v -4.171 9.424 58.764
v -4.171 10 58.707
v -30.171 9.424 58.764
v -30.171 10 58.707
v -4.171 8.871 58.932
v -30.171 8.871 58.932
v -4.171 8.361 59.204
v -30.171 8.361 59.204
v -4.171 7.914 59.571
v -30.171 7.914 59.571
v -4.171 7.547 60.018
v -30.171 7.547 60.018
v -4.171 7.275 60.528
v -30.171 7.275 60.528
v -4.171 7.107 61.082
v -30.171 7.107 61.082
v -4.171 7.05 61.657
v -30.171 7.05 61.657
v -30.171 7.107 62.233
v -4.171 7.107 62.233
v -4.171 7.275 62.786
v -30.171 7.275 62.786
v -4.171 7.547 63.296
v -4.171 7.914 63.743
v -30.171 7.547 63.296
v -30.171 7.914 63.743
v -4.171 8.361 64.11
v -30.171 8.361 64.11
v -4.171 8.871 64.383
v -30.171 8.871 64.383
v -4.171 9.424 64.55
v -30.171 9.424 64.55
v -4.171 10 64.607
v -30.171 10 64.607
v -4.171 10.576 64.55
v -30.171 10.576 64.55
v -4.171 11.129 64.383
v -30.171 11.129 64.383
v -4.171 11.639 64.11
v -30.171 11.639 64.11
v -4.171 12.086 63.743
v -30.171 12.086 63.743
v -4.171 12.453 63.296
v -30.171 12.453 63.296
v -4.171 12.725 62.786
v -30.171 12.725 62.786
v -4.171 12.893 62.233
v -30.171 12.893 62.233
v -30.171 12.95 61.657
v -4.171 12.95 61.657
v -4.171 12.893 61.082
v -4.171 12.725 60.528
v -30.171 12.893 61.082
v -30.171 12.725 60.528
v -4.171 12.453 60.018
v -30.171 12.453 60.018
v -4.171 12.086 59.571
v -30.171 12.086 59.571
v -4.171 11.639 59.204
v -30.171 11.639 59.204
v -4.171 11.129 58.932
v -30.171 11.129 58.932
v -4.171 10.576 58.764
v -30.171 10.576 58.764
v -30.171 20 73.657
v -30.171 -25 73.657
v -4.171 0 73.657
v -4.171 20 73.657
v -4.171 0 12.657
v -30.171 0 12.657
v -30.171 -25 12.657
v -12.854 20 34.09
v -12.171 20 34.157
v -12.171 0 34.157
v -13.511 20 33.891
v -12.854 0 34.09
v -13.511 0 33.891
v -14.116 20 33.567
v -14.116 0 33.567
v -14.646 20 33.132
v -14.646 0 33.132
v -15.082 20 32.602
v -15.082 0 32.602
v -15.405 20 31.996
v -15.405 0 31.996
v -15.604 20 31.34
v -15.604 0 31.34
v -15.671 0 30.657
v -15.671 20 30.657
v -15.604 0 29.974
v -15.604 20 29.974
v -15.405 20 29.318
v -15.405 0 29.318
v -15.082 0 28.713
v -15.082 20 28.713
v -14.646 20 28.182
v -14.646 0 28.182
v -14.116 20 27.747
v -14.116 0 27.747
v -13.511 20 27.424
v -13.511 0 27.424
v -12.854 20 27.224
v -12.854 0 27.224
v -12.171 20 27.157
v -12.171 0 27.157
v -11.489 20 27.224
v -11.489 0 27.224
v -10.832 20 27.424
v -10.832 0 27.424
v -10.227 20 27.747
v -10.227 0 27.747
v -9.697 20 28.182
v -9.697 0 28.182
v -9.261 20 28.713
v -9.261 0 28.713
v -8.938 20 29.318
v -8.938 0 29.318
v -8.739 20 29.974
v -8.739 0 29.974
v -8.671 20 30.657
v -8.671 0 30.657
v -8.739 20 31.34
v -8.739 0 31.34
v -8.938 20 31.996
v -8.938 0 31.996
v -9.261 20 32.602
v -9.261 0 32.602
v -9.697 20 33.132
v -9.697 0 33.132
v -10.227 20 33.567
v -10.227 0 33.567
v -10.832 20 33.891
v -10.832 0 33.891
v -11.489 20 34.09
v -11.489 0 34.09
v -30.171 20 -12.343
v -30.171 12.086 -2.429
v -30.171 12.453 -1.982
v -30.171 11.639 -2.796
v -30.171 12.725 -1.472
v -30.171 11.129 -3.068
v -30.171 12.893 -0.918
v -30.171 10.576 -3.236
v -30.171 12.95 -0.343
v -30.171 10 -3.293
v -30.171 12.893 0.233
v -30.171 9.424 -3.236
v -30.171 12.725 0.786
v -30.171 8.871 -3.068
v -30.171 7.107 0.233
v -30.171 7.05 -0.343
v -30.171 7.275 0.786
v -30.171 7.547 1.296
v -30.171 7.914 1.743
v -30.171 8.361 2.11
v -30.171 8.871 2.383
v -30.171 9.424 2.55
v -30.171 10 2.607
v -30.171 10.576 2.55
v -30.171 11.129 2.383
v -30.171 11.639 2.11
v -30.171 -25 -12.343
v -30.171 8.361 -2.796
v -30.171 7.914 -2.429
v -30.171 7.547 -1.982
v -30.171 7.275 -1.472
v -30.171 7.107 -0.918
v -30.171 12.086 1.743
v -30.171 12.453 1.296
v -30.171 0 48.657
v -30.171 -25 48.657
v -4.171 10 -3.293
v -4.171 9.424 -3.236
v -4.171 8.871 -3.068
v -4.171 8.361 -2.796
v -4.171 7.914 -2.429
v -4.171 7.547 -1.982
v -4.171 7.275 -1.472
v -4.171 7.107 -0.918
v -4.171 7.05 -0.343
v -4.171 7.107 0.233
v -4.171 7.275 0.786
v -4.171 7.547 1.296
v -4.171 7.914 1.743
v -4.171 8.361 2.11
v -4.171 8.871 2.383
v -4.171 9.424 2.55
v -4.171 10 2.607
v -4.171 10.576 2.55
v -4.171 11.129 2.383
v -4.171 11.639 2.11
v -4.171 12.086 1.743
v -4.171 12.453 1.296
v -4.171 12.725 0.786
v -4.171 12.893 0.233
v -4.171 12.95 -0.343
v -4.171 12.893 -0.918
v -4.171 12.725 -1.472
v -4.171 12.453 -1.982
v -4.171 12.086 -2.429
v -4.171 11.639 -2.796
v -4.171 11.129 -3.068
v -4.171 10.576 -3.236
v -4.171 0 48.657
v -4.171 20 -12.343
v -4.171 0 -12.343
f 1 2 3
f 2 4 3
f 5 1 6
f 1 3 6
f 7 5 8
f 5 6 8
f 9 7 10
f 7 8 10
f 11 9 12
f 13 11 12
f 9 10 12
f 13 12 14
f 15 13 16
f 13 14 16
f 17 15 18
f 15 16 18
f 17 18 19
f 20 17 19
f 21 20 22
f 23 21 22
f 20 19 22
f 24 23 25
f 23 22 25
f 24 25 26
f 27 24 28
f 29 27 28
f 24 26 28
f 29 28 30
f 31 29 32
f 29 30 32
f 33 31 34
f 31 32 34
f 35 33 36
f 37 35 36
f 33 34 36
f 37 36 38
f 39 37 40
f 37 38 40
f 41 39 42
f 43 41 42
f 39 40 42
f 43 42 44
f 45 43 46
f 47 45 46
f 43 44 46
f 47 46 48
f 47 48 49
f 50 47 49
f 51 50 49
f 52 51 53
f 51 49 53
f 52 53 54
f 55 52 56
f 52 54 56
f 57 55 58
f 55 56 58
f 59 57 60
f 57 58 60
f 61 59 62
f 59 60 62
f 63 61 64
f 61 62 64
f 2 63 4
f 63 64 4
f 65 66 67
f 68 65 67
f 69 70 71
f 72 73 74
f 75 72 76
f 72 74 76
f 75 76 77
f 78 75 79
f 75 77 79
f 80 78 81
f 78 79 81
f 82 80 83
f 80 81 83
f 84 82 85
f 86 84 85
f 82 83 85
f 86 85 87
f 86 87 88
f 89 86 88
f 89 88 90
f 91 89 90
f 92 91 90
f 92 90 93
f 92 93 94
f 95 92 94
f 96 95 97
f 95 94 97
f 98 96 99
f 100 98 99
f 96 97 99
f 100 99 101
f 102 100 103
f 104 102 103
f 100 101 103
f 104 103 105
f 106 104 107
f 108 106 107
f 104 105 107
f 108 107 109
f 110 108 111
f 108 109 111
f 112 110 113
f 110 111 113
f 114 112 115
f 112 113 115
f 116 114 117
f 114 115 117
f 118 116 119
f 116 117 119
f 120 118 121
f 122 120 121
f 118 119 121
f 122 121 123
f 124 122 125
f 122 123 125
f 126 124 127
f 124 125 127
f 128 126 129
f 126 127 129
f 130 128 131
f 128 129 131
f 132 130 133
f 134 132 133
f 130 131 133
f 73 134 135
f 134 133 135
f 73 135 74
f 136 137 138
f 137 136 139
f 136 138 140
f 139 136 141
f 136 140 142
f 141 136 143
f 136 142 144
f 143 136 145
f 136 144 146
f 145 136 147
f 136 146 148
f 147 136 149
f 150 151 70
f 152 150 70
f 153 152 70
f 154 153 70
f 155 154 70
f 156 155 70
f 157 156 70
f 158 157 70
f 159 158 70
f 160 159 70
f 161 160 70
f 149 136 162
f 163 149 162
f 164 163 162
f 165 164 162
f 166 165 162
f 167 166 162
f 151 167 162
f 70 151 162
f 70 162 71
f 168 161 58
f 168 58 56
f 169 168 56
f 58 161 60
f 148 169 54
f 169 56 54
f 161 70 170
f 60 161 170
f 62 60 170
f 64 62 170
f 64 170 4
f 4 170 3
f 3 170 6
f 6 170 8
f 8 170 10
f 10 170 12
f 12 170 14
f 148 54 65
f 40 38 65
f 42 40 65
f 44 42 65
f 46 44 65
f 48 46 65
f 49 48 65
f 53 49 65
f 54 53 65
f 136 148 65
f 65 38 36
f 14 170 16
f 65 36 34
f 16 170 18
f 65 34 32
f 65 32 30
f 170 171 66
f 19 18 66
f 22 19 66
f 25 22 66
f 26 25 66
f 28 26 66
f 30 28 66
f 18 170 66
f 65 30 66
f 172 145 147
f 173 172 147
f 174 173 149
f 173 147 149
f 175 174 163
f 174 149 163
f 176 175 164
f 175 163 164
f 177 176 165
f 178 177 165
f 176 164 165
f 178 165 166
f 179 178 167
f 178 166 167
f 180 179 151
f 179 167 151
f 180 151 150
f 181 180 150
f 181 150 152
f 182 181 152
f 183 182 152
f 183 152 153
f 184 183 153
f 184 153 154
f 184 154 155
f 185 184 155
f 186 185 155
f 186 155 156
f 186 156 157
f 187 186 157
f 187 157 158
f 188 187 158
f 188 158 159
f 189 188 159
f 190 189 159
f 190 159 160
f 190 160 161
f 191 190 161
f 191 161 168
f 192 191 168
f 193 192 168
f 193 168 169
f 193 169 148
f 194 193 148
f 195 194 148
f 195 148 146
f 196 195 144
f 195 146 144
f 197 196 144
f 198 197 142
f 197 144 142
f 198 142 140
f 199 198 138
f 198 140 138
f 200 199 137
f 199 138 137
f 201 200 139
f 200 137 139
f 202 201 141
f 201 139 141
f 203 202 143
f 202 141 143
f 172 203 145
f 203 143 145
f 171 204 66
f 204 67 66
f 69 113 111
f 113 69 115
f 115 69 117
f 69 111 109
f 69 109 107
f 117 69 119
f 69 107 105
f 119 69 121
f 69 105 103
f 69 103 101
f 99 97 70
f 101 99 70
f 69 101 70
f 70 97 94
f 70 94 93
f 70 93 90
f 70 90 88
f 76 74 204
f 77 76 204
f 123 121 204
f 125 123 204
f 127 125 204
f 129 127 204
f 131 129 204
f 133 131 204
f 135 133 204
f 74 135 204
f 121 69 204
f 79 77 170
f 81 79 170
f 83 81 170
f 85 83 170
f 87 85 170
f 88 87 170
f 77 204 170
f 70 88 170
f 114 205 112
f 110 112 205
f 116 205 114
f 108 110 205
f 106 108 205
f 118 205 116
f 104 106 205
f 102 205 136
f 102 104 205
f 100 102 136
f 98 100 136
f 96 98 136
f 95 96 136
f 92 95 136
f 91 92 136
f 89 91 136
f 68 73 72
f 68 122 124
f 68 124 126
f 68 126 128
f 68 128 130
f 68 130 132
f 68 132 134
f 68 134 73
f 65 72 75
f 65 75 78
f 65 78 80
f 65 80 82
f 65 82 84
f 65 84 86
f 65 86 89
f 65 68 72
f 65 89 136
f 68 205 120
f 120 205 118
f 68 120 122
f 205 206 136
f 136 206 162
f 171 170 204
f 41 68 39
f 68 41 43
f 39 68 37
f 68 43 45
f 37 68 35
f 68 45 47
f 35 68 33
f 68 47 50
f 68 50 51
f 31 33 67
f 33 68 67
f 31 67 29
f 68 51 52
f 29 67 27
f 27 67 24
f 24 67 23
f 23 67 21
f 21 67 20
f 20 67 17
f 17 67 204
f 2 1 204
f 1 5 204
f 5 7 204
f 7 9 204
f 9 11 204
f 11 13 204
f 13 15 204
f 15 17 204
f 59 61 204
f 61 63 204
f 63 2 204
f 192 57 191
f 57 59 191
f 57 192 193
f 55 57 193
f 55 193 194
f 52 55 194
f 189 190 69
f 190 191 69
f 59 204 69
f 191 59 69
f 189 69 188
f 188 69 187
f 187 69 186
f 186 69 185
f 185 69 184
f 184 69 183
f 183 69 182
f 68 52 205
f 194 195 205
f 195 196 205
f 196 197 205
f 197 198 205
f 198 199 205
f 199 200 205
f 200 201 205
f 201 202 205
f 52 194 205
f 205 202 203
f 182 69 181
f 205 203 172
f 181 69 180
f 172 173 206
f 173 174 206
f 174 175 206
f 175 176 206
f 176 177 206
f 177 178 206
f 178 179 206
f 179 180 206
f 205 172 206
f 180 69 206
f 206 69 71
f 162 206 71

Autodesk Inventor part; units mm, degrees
ref_plane "YZ Plane" through (0, 0, 0) normal (1, 0, 0) x (0, 1, 0)
ref_plane "XZ Plane" through (0, 0, 0) normal (0, 1, 0) x (-1, 0, 0)
ref_plane "XY Plane" through (0, 0, 0) normal (0, 0, 1) x (1, 0, 0)
sketch "Schizzo1" plane through (0, 0, 0) normal (0, 1, 0) x (-1, 0, 0)
  line L0 (30.1714, 73.6571) -> (4.1714, 73.6571)
  line L1 (4.1714, 73.6571) -> (4.1714, -12.3429)
  line L2 (4.1714, -12.3429) -> (30.1714, -12.3429)
  line L3 (30.1714, -12.3429) -> (30.1714, 73.6571)
  line L4 (30.1714, 73.6571) -> (4.1714, -12.3429) construction
  line L5 (4.1714, 73.6571) -> (30.1714, -12.3429) construction
  point P0 (0, 0)
  point P1 (17.1714, 30.6571)
  dimension "d0" = 26
  dimension "d1" = 86
extrude "Estrusione1" add sketch "Schizzo1" along normal blind 20
sketch "Schizzo2" plane through (0, 0, 0) normal (0, -1, 0) x (1, 0, 0)
  line L0 (-4.1714, -12.3429) -> (-30.1714, -12.3429) projected
  line L1 (-4.1714, -12.3429) -> (-30.1714, -12.3429)
  line L2 (-30.1714, -12.3429) -> (-30.1714, 12.6571)
  line L3 (-30.1714, 12.6571) -> (-4.1714, 12.6571)
  line L4 (-4.1714, 12.6571) -> (-4.1714, -12.3429)
  line L5 (-30.1714, 73.6571) -> (-4.1714, 73.6571) projected
  line L6 (-4.1714, 73.6571) -> (-30.1714, 73.6571)
  line L7 (-30.1714, 73.6571) -> (-30.1714, 48.6571)
  line L8 (-30.1714, 48.6571) -> (-4.1714, 48.6571)
  line L9 (-4.1714, 48.6571) -> (-4.1714, 73.6571)
  point P0 (0, 0)
  dimension "d4" = 25
  dimension "d5" = 25
extrude "Estrusione2" add sketch "Schizzo2" along normal blind 25
sketch "Schizzo3" plane through (-30.1714, 20, 73.6571) normal (0, 0, 1) x (1, 0, 0)
  line L0 (0, -20) -> (0, -45) projected
  line L1 (0, -45) -> (26, -45) projected
  line L2 (0, -45) -> (26, -45)
  line L3 (26, -20) -> (26, -45) projected
  line L4 (26, -45) -> (26, -20)
  line L5 (26, -20) -> (0, -45)
  point P0 (30.1714, -20)
extrude "Estrusione3" cut sketch "Schizzo3" against normal through all
sketch "Schizzo4" plane through (-4.1714, 20, 73.6571) normal (1, 0, 0) x (0, 0, -1)
  line L0 (86, 0) -> (0, 0) projected
  line L1 (0, 0) -> (0, -10)
  line L2 (0, -45) -> (0, 0) projected
  line L3 (0, 0) -> (10, 0) construction
  line L4 (0, -10) -> (12, -10)
  line L5 (86, 0) -> (86, -10)
  line L6 (86, -45) -> (86, 0) projected
  line L7 (86, 0) -> (96, 0) construction
  line L8 (86, -10) -> (74, -10)
  circle A0 centre (12, -10) radius 2.5
  circle A1 centre (74, -10) radius 2.5
  point P0 (73.6571, -20)
  dimension "d10" = 10
  dimension "d11" = 90
  dimension "d12" = 12
  dimension "d13" = 90
  dimension "d14" = 10
  dimension "d15" = 90
  dimension "d16" = 12
  dimension "d17" = 90
  dimension "d18" = 5
  dimension "d19" = 5
hole "Foro1" at (-4.1714, 10, 61.6571) at (-4.1714, 10, -0.3429) direction (-1, 0, 0) diameter 5.9 end through all clearance for "Vite a testa piana" size "M5" standard "ANSI - Profilo M Metrico"
sketch "Schizzo5" plane through (0, 20, 0) normal (0, 1, 0) x (1, 0, 0)
  line L0 (-30.1714, -73.6571) -> (-4.1714, -73.6571) projected
  line L1 (-30.1714, 12.3429) -> (-30.1714, -73.6571) projected
  line L2 (-30.1714, -73.6571) -> (-30.1714, 12.3429)
  line L3 (-30.1714, -30.6571) -> (-12.1714, -30.6571)
  line L4 (-30.1714, -30.6571) -> (-12.1714, -30.6571) construction
  point P0 (0, 0)
  dimension "d27" = 18
  dimension "d28" = 0
hole "Foro2" at (-12.1714, 20, 30.6571) direction (0, -1, 0) diameter 7 end through all clearance for "Vite a testa piana" size "M6" standard "ANSI - Profilo M Metrico"
properties part number "23_Blocco_Escursione_Braccio_2"
